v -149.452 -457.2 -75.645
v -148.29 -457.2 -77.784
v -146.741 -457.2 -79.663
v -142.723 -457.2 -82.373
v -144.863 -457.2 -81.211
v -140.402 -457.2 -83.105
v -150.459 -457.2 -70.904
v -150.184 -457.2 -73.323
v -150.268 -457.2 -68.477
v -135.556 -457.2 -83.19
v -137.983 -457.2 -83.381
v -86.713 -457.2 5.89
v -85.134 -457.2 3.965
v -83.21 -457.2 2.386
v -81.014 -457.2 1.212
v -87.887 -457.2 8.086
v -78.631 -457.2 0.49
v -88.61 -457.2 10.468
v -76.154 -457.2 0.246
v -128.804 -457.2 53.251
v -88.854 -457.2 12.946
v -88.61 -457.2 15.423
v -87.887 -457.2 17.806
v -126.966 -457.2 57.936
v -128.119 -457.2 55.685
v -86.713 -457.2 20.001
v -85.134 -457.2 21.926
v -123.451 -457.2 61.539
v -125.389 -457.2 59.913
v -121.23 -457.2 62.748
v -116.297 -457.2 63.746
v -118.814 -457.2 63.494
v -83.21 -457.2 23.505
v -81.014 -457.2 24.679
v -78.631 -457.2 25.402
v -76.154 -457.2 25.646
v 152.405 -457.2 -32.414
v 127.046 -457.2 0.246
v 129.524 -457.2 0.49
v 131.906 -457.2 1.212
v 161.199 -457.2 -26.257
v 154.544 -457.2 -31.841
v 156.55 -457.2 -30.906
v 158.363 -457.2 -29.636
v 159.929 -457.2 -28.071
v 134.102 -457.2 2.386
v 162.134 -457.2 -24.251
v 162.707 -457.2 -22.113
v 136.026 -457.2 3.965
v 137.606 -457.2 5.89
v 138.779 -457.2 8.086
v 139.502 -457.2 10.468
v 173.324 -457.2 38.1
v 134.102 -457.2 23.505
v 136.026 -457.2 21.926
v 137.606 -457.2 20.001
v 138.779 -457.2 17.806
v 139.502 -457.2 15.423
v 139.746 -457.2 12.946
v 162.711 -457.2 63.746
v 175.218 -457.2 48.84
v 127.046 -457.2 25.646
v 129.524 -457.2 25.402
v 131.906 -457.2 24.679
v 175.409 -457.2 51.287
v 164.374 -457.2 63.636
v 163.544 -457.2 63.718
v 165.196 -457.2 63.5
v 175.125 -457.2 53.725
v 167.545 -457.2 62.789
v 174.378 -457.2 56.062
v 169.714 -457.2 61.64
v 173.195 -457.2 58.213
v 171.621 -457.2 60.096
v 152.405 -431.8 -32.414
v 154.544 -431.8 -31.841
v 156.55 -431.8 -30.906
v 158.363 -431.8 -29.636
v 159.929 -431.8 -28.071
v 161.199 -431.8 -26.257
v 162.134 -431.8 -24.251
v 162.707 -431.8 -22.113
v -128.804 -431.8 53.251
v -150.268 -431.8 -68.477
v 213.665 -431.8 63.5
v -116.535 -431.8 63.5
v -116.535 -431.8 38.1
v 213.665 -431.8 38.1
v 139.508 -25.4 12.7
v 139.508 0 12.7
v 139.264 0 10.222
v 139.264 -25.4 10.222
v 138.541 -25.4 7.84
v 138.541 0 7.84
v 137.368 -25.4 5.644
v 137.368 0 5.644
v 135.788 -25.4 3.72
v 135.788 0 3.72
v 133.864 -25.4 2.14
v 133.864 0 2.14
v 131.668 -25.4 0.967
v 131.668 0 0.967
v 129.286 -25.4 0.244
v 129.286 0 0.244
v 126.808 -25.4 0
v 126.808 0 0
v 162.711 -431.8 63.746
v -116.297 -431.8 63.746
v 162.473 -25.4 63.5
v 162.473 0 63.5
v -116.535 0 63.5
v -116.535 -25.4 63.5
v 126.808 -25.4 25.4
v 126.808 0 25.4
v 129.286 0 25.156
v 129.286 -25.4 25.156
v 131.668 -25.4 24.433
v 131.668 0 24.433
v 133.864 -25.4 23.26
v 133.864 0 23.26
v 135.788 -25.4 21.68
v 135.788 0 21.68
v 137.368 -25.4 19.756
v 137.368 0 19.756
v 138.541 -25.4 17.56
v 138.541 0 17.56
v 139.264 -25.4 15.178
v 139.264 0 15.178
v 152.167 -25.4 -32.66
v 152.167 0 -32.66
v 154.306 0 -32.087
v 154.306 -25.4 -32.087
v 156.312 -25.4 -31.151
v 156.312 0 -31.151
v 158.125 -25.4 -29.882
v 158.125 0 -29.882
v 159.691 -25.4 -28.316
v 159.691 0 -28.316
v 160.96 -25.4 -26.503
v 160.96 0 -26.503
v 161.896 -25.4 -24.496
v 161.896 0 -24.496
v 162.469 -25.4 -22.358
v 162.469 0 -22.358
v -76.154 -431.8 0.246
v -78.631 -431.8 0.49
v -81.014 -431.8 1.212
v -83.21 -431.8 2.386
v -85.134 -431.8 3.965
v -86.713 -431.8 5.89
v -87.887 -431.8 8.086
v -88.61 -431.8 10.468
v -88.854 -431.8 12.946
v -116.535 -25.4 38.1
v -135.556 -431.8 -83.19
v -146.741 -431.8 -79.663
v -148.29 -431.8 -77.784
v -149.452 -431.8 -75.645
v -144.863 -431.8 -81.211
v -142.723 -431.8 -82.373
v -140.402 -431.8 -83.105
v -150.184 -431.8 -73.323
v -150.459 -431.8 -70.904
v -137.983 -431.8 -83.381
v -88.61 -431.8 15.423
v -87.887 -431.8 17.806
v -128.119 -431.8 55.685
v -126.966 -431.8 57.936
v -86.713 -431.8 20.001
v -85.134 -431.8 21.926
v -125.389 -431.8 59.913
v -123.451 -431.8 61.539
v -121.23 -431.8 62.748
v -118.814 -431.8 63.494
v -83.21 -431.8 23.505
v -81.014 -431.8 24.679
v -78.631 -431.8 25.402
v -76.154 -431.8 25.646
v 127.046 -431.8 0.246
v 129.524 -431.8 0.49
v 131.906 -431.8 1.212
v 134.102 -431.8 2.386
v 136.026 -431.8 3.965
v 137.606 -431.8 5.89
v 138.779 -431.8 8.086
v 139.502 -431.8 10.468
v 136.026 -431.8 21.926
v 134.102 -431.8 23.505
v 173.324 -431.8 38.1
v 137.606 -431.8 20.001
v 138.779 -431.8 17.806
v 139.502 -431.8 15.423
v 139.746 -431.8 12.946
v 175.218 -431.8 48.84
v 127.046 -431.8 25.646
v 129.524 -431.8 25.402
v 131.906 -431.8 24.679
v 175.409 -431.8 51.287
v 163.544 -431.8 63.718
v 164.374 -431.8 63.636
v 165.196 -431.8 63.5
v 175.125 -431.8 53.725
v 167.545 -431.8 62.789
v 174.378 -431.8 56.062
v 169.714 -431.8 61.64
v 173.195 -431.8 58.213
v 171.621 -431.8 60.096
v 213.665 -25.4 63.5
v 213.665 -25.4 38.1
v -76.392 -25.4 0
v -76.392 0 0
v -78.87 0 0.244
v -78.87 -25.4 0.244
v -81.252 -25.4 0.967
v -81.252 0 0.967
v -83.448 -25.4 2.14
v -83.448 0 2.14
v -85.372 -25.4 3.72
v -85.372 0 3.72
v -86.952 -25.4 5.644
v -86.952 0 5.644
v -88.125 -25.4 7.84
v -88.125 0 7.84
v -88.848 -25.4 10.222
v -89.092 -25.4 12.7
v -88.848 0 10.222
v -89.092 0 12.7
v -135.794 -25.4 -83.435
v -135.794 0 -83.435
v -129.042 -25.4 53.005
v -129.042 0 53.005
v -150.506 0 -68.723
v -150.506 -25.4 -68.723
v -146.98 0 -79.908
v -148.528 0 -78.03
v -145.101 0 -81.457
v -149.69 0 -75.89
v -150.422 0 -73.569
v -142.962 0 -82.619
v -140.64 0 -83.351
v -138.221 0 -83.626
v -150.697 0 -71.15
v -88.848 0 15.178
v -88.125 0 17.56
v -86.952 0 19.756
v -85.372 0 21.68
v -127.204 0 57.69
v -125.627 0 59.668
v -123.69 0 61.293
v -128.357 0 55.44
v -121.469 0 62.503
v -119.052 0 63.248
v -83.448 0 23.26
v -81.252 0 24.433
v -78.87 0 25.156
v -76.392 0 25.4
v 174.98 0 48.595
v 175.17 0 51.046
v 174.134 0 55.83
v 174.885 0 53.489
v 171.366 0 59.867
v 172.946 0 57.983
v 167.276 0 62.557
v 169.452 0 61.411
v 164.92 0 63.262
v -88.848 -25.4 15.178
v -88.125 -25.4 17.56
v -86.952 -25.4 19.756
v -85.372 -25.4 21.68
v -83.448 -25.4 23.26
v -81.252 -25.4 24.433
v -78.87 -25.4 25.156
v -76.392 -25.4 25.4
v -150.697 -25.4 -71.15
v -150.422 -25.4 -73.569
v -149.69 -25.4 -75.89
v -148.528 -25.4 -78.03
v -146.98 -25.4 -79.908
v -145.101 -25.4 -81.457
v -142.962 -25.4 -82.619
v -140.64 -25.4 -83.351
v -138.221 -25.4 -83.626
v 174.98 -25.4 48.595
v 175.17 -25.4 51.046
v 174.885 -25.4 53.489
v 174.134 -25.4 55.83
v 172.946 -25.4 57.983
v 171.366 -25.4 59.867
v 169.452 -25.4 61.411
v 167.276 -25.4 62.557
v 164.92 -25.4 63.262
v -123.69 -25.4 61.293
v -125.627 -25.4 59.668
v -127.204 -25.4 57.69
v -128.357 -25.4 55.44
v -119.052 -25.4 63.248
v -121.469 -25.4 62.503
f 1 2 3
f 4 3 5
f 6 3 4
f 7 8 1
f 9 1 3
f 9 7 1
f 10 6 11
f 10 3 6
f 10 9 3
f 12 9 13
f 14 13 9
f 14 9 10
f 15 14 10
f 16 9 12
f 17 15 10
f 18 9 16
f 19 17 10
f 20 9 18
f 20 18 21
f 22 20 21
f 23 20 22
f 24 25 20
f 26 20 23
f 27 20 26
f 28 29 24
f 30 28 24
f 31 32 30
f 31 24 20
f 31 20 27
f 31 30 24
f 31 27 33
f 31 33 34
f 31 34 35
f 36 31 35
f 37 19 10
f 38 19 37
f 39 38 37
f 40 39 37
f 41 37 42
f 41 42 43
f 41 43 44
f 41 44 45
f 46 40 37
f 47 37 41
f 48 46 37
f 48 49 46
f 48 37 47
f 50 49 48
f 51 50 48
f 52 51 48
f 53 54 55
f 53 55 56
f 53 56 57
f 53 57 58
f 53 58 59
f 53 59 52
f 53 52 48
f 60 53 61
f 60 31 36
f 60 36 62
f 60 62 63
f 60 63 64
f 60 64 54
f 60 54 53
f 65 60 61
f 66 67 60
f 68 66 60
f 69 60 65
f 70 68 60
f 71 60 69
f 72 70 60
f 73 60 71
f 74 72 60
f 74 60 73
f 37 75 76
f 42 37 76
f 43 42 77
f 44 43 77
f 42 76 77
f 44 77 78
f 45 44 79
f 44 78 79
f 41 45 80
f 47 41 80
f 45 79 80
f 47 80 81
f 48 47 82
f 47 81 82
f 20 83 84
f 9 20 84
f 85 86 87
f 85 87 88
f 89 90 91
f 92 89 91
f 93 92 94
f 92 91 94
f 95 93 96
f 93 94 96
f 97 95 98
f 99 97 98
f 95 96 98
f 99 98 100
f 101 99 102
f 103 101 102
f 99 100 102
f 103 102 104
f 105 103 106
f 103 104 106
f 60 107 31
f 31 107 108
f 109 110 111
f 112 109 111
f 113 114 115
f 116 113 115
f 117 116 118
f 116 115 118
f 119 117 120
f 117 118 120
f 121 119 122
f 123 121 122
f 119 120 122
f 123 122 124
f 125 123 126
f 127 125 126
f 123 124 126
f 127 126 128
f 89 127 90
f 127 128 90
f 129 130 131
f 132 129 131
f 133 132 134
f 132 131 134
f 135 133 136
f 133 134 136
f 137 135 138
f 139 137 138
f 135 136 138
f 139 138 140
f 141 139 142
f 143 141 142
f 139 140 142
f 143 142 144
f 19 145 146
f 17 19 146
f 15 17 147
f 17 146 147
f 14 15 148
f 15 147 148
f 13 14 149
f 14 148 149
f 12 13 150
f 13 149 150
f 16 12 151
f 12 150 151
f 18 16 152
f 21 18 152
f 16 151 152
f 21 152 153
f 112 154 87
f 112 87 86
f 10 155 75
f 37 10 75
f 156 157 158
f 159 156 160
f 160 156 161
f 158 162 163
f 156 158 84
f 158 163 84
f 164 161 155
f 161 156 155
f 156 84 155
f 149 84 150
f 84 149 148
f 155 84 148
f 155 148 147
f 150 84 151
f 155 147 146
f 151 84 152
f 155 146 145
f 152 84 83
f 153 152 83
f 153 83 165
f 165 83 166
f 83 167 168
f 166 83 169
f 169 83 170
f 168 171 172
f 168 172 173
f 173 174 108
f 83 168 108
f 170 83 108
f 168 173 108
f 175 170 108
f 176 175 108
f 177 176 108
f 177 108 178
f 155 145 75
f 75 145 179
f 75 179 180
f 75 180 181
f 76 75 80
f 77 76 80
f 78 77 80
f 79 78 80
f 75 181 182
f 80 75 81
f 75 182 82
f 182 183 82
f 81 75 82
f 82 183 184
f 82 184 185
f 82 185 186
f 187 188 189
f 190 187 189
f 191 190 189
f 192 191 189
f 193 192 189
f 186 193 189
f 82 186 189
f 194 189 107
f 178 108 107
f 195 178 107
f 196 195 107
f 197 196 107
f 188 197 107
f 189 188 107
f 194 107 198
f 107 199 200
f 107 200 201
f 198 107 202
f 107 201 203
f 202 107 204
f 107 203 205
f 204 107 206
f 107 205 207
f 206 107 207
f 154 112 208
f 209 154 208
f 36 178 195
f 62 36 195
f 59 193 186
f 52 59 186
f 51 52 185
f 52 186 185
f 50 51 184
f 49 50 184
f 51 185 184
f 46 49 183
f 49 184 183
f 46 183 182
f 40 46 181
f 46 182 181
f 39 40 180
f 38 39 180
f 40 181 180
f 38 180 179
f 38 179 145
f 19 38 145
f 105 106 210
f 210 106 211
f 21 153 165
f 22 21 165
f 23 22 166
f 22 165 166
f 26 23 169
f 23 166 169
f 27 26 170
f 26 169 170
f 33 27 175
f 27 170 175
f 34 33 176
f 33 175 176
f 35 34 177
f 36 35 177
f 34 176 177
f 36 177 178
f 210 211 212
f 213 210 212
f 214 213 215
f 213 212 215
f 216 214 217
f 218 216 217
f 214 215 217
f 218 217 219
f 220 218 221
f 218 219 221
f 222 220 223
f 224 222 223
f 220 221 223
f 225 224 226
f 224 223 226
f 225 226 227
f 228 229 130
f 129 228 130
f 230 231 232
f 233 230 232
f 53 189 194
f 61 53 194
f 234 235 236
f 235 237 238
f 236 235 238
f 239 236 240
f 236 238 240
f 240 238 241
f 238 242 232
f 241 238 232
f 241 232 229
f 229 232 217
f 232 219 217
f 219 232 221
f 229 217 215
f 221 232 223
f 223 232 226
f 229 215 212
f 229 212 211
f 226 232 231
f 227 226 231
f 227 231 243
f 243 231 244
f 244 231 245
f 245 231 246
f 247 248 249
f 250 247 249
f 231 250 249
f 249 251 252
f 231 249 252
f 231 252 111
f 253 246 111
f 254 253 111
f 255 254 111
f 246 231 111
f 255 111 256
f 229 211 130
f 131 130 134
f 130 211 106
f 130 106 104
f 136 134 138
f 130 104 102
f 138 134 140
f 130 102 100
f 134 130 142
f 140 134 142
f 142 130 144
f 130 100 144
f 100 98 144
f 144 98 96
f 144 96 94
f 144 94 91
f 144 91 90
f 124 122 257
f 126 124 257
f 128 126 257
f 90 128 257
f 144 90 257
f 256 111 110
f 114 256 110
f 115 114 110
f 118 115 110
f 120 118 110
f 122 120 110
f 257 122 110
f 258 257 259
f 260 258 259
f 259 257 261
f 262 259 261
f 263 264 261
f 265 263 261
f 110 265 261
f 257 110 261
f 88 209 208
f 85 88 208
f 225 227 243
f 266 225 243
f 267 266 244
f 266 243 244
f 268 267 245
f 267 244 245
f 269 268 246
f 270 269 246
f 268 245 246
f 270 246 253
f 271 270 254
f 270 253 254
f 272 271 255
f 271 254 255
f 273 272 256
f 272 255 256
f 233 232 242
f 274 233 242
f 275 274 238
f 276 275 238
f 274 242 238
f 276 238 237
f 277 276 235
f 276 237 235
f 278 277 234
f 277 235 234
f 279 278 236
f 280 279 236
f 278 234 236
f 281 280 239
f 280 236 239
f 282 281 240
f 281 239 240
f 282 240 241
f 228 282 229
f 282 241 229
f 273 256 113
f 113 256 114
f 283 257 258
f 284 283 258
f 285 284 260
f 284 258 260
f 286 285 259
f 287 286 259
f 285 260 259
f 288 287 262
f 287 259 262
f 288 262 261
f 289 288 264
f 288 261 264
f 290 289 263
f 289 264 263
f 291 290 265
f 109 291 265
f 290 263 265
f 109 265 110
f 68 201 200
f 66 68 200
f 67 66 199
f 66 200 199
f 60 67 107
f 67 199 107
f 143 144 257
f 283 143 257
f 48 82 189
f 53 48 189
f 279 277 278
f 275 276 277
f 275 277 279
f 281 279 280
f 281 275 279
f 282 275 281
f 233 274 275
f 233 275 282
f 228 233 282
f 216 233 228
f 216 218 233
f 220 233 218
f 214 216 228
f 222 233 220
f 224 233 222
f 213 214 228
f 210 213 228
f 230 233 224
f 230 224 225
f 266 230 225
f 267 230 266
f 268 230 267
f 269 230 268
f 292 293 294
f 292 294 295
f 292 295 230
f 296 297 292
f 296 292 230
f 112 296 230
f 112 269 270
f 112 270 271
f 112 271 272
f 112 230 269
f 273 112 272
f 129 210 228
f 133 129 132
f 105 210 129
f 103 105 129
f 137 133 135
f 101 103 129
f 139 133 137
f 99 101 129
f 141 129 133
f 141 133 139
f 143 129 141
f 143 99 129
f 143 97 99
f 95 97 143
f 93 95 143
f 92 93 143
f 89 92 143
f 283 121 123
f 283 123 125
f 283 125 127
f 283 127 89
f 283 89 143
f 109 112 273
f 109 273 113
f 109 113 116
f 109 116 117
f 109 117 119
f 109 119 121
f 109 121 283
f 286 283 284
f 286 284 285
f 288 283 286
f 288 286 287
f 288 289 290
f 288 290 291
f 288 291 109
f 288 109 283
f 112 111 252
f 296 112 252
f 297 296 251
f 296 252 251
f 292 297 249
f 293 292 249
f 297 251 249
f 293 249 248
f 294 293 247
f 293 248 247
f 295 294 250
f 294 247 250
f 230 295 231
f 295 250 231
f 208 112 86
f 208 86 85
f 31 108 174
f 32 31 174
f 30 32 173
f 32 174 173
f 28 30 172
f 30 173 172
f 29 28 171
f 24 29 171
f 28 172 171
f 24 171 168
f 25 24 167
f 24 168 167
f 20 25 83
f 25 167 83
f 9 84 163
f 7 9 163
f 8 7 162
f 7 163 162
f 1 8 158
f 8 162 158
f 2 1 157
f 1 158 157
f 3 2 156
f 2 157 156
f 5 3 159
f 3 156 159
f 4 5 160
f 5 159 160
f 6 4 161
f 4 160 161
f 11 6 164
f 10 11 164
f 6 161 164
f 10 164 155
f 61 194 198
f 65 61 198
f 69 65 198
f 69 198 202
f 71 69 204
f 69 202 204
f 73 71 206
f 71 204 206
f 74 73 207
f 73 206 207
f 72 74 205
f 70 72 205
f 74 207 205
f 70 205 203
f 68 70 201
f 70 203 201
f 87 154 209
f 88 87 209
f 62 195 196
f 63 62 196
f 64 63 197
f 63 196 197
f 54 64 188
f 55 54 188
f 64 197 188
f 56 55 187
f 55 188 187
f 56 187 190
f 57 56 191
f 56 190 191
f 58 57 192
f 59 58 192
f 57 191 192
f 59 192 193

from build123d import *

# Parameters (mm, degrees)
F1_DEPTH = 25.4
F2_W     = 330.2
F2_H     = 25.4
F3_DEPTH = 406.4
F5_DEPTH = 25.4


with BuildPart() as f1:
    # F0 (on Front) → F1 (new body)
    with BuildSketch(Plane.XZ):
        with BuildLine():
            Line((162.472783, 63.5), (-116.535381, 63.5))
            ThreePointArc((-116.535381, 63.5), (-124.698784, 60.528764), (-129.04244, 53.005332))
            Line((-129.04244, 53.005332), (-150.506389, -68.722771))
            ThreePointArc((-150.506389, -68.722771), (-146.979586, -79.908359), (-135.793998, -83.435161))
            Line((-135.793998, -83.435161), (152.167227, -32.659828))
            ThreePointArc((152.167227, -32.659828), (158.942151, -29.133026), (162.468954, -22.358101))
            Line((162.468954, -22.358101), (174.979841, 48.594668))
            ThreePointArc((174.979841, 48.594668), (172.201547, 58.963403), (162.472783, 63.5))
        make_face()
        with BuildLine():
            ThreePointArc((-89.091947, 12.7), (-85.372203, 21.680256), (-76.391947, 25.4))
            Line((-76.391947, 25.4), (126.808053, 25.4))
            ThreePointArc((126.808053, 25.4), (135.78831, 21.680256), (139.508053, 12.7))
            ThreePointArc((139.508053, 12.7), (135.78831, 3.719744), (126.808053, 0))
            Line((126.808053, 0), (-76.391947, 0))
            ThreePointArc((-76.391947, 0), (-85.372203, 3.719744), (-89.091947, 12.7))
        make_face(mode=Mode.SUBTRACT)
    extrude(amount=F1_DEPTH)


with BuildPart() as f3:
    # F2 (on face) → F3 (new body)
    with BuildSketch(Plane.XZ.offset(25.4)):
        with Locations((48.564619, 50.8)):
            Rectangle(F2_W, F2_H)
    extrude(amount=F3_DEPTH)


with BuildPart() as f5:
    # F4 (on face) → F5 (new body)
    with BuildSketch(Plane.XZ.offset(431.8)):
        with BuildLine():
            Line((162.710942, 63.745592), (-116.297223, 63.745592))
            ThreePointArc((-116.297223, 63.745592), (-124.460625, 60.774357), (-128.804281, 53.250924))
            Line((-128.804281, 53.250924), (-150.26823, -68.477179))
            ThreePointArc((-150.26823, -68.477179), (-146.741427, -79.662767), (-135.555839, -83.189569))
            Line((-135.555839, -83.189569), (152.405386, -32.414236))
            ThreePointArc((152.405386, -32.414236), (159.18031, -28.887433), (162.707112, -22.112509))
            Line((162.707112, -22.112509), (173.324202, 38.1))
            Line((173.324202, 38.1), (-116.535381, 38.1))
            Line((-116.535381, 38.1), (-116.535381, 63.5))
            Line((-116.535381, 63.5), (165.196445, 63.5))
            ThreePointArc((165.196445, 63.5), (163.959745, 63.684045), (162.710942, 63.745592))
        make_face()
        with BuildLine():
            ThreePointArc((-88.853788, 12.945592), (-85.134044, 21.925848), (-76.153788, 25.645592))
            Line((-76.153788, 25.645592), (127.046212, 25.645592))
            ThreePointArc((127.046212, 25.645592), (136.026468, 21.925848), (139.746212, 12.945592))
            ThreePointArc((139.746212, 12.945592), (136.026468, 3.965336), (127.046212, 0.245592))
            Line((127.046212, 0.245592), (-76.153788, 0.245592))
            ThreePointArc((-76.153788, 0.245592), (-85.134044, 3.965336), (-88.853788, 12.945592))
        make_face(mode=Mode.SUBTRACT)
        with BuildLine():
            ThreePointArc((175.218, 48.84026), (173.195274, 58.212794), (165.196445, 63.5))
            Line((165.196445, 63.5), (-116.535381, 63.5))
            Line((-116.535381, 63.5), (-116.535381, 38.1))
            Line((-116.535381, 38.1), (173.324202, 38.1))
            Line((173.324202, 38.1), (175.218, 48.84026))
        make_face()
    extrude(amount=F5_DEPTH)


solid = Compound([f1.part, f3.part, f5.part])
